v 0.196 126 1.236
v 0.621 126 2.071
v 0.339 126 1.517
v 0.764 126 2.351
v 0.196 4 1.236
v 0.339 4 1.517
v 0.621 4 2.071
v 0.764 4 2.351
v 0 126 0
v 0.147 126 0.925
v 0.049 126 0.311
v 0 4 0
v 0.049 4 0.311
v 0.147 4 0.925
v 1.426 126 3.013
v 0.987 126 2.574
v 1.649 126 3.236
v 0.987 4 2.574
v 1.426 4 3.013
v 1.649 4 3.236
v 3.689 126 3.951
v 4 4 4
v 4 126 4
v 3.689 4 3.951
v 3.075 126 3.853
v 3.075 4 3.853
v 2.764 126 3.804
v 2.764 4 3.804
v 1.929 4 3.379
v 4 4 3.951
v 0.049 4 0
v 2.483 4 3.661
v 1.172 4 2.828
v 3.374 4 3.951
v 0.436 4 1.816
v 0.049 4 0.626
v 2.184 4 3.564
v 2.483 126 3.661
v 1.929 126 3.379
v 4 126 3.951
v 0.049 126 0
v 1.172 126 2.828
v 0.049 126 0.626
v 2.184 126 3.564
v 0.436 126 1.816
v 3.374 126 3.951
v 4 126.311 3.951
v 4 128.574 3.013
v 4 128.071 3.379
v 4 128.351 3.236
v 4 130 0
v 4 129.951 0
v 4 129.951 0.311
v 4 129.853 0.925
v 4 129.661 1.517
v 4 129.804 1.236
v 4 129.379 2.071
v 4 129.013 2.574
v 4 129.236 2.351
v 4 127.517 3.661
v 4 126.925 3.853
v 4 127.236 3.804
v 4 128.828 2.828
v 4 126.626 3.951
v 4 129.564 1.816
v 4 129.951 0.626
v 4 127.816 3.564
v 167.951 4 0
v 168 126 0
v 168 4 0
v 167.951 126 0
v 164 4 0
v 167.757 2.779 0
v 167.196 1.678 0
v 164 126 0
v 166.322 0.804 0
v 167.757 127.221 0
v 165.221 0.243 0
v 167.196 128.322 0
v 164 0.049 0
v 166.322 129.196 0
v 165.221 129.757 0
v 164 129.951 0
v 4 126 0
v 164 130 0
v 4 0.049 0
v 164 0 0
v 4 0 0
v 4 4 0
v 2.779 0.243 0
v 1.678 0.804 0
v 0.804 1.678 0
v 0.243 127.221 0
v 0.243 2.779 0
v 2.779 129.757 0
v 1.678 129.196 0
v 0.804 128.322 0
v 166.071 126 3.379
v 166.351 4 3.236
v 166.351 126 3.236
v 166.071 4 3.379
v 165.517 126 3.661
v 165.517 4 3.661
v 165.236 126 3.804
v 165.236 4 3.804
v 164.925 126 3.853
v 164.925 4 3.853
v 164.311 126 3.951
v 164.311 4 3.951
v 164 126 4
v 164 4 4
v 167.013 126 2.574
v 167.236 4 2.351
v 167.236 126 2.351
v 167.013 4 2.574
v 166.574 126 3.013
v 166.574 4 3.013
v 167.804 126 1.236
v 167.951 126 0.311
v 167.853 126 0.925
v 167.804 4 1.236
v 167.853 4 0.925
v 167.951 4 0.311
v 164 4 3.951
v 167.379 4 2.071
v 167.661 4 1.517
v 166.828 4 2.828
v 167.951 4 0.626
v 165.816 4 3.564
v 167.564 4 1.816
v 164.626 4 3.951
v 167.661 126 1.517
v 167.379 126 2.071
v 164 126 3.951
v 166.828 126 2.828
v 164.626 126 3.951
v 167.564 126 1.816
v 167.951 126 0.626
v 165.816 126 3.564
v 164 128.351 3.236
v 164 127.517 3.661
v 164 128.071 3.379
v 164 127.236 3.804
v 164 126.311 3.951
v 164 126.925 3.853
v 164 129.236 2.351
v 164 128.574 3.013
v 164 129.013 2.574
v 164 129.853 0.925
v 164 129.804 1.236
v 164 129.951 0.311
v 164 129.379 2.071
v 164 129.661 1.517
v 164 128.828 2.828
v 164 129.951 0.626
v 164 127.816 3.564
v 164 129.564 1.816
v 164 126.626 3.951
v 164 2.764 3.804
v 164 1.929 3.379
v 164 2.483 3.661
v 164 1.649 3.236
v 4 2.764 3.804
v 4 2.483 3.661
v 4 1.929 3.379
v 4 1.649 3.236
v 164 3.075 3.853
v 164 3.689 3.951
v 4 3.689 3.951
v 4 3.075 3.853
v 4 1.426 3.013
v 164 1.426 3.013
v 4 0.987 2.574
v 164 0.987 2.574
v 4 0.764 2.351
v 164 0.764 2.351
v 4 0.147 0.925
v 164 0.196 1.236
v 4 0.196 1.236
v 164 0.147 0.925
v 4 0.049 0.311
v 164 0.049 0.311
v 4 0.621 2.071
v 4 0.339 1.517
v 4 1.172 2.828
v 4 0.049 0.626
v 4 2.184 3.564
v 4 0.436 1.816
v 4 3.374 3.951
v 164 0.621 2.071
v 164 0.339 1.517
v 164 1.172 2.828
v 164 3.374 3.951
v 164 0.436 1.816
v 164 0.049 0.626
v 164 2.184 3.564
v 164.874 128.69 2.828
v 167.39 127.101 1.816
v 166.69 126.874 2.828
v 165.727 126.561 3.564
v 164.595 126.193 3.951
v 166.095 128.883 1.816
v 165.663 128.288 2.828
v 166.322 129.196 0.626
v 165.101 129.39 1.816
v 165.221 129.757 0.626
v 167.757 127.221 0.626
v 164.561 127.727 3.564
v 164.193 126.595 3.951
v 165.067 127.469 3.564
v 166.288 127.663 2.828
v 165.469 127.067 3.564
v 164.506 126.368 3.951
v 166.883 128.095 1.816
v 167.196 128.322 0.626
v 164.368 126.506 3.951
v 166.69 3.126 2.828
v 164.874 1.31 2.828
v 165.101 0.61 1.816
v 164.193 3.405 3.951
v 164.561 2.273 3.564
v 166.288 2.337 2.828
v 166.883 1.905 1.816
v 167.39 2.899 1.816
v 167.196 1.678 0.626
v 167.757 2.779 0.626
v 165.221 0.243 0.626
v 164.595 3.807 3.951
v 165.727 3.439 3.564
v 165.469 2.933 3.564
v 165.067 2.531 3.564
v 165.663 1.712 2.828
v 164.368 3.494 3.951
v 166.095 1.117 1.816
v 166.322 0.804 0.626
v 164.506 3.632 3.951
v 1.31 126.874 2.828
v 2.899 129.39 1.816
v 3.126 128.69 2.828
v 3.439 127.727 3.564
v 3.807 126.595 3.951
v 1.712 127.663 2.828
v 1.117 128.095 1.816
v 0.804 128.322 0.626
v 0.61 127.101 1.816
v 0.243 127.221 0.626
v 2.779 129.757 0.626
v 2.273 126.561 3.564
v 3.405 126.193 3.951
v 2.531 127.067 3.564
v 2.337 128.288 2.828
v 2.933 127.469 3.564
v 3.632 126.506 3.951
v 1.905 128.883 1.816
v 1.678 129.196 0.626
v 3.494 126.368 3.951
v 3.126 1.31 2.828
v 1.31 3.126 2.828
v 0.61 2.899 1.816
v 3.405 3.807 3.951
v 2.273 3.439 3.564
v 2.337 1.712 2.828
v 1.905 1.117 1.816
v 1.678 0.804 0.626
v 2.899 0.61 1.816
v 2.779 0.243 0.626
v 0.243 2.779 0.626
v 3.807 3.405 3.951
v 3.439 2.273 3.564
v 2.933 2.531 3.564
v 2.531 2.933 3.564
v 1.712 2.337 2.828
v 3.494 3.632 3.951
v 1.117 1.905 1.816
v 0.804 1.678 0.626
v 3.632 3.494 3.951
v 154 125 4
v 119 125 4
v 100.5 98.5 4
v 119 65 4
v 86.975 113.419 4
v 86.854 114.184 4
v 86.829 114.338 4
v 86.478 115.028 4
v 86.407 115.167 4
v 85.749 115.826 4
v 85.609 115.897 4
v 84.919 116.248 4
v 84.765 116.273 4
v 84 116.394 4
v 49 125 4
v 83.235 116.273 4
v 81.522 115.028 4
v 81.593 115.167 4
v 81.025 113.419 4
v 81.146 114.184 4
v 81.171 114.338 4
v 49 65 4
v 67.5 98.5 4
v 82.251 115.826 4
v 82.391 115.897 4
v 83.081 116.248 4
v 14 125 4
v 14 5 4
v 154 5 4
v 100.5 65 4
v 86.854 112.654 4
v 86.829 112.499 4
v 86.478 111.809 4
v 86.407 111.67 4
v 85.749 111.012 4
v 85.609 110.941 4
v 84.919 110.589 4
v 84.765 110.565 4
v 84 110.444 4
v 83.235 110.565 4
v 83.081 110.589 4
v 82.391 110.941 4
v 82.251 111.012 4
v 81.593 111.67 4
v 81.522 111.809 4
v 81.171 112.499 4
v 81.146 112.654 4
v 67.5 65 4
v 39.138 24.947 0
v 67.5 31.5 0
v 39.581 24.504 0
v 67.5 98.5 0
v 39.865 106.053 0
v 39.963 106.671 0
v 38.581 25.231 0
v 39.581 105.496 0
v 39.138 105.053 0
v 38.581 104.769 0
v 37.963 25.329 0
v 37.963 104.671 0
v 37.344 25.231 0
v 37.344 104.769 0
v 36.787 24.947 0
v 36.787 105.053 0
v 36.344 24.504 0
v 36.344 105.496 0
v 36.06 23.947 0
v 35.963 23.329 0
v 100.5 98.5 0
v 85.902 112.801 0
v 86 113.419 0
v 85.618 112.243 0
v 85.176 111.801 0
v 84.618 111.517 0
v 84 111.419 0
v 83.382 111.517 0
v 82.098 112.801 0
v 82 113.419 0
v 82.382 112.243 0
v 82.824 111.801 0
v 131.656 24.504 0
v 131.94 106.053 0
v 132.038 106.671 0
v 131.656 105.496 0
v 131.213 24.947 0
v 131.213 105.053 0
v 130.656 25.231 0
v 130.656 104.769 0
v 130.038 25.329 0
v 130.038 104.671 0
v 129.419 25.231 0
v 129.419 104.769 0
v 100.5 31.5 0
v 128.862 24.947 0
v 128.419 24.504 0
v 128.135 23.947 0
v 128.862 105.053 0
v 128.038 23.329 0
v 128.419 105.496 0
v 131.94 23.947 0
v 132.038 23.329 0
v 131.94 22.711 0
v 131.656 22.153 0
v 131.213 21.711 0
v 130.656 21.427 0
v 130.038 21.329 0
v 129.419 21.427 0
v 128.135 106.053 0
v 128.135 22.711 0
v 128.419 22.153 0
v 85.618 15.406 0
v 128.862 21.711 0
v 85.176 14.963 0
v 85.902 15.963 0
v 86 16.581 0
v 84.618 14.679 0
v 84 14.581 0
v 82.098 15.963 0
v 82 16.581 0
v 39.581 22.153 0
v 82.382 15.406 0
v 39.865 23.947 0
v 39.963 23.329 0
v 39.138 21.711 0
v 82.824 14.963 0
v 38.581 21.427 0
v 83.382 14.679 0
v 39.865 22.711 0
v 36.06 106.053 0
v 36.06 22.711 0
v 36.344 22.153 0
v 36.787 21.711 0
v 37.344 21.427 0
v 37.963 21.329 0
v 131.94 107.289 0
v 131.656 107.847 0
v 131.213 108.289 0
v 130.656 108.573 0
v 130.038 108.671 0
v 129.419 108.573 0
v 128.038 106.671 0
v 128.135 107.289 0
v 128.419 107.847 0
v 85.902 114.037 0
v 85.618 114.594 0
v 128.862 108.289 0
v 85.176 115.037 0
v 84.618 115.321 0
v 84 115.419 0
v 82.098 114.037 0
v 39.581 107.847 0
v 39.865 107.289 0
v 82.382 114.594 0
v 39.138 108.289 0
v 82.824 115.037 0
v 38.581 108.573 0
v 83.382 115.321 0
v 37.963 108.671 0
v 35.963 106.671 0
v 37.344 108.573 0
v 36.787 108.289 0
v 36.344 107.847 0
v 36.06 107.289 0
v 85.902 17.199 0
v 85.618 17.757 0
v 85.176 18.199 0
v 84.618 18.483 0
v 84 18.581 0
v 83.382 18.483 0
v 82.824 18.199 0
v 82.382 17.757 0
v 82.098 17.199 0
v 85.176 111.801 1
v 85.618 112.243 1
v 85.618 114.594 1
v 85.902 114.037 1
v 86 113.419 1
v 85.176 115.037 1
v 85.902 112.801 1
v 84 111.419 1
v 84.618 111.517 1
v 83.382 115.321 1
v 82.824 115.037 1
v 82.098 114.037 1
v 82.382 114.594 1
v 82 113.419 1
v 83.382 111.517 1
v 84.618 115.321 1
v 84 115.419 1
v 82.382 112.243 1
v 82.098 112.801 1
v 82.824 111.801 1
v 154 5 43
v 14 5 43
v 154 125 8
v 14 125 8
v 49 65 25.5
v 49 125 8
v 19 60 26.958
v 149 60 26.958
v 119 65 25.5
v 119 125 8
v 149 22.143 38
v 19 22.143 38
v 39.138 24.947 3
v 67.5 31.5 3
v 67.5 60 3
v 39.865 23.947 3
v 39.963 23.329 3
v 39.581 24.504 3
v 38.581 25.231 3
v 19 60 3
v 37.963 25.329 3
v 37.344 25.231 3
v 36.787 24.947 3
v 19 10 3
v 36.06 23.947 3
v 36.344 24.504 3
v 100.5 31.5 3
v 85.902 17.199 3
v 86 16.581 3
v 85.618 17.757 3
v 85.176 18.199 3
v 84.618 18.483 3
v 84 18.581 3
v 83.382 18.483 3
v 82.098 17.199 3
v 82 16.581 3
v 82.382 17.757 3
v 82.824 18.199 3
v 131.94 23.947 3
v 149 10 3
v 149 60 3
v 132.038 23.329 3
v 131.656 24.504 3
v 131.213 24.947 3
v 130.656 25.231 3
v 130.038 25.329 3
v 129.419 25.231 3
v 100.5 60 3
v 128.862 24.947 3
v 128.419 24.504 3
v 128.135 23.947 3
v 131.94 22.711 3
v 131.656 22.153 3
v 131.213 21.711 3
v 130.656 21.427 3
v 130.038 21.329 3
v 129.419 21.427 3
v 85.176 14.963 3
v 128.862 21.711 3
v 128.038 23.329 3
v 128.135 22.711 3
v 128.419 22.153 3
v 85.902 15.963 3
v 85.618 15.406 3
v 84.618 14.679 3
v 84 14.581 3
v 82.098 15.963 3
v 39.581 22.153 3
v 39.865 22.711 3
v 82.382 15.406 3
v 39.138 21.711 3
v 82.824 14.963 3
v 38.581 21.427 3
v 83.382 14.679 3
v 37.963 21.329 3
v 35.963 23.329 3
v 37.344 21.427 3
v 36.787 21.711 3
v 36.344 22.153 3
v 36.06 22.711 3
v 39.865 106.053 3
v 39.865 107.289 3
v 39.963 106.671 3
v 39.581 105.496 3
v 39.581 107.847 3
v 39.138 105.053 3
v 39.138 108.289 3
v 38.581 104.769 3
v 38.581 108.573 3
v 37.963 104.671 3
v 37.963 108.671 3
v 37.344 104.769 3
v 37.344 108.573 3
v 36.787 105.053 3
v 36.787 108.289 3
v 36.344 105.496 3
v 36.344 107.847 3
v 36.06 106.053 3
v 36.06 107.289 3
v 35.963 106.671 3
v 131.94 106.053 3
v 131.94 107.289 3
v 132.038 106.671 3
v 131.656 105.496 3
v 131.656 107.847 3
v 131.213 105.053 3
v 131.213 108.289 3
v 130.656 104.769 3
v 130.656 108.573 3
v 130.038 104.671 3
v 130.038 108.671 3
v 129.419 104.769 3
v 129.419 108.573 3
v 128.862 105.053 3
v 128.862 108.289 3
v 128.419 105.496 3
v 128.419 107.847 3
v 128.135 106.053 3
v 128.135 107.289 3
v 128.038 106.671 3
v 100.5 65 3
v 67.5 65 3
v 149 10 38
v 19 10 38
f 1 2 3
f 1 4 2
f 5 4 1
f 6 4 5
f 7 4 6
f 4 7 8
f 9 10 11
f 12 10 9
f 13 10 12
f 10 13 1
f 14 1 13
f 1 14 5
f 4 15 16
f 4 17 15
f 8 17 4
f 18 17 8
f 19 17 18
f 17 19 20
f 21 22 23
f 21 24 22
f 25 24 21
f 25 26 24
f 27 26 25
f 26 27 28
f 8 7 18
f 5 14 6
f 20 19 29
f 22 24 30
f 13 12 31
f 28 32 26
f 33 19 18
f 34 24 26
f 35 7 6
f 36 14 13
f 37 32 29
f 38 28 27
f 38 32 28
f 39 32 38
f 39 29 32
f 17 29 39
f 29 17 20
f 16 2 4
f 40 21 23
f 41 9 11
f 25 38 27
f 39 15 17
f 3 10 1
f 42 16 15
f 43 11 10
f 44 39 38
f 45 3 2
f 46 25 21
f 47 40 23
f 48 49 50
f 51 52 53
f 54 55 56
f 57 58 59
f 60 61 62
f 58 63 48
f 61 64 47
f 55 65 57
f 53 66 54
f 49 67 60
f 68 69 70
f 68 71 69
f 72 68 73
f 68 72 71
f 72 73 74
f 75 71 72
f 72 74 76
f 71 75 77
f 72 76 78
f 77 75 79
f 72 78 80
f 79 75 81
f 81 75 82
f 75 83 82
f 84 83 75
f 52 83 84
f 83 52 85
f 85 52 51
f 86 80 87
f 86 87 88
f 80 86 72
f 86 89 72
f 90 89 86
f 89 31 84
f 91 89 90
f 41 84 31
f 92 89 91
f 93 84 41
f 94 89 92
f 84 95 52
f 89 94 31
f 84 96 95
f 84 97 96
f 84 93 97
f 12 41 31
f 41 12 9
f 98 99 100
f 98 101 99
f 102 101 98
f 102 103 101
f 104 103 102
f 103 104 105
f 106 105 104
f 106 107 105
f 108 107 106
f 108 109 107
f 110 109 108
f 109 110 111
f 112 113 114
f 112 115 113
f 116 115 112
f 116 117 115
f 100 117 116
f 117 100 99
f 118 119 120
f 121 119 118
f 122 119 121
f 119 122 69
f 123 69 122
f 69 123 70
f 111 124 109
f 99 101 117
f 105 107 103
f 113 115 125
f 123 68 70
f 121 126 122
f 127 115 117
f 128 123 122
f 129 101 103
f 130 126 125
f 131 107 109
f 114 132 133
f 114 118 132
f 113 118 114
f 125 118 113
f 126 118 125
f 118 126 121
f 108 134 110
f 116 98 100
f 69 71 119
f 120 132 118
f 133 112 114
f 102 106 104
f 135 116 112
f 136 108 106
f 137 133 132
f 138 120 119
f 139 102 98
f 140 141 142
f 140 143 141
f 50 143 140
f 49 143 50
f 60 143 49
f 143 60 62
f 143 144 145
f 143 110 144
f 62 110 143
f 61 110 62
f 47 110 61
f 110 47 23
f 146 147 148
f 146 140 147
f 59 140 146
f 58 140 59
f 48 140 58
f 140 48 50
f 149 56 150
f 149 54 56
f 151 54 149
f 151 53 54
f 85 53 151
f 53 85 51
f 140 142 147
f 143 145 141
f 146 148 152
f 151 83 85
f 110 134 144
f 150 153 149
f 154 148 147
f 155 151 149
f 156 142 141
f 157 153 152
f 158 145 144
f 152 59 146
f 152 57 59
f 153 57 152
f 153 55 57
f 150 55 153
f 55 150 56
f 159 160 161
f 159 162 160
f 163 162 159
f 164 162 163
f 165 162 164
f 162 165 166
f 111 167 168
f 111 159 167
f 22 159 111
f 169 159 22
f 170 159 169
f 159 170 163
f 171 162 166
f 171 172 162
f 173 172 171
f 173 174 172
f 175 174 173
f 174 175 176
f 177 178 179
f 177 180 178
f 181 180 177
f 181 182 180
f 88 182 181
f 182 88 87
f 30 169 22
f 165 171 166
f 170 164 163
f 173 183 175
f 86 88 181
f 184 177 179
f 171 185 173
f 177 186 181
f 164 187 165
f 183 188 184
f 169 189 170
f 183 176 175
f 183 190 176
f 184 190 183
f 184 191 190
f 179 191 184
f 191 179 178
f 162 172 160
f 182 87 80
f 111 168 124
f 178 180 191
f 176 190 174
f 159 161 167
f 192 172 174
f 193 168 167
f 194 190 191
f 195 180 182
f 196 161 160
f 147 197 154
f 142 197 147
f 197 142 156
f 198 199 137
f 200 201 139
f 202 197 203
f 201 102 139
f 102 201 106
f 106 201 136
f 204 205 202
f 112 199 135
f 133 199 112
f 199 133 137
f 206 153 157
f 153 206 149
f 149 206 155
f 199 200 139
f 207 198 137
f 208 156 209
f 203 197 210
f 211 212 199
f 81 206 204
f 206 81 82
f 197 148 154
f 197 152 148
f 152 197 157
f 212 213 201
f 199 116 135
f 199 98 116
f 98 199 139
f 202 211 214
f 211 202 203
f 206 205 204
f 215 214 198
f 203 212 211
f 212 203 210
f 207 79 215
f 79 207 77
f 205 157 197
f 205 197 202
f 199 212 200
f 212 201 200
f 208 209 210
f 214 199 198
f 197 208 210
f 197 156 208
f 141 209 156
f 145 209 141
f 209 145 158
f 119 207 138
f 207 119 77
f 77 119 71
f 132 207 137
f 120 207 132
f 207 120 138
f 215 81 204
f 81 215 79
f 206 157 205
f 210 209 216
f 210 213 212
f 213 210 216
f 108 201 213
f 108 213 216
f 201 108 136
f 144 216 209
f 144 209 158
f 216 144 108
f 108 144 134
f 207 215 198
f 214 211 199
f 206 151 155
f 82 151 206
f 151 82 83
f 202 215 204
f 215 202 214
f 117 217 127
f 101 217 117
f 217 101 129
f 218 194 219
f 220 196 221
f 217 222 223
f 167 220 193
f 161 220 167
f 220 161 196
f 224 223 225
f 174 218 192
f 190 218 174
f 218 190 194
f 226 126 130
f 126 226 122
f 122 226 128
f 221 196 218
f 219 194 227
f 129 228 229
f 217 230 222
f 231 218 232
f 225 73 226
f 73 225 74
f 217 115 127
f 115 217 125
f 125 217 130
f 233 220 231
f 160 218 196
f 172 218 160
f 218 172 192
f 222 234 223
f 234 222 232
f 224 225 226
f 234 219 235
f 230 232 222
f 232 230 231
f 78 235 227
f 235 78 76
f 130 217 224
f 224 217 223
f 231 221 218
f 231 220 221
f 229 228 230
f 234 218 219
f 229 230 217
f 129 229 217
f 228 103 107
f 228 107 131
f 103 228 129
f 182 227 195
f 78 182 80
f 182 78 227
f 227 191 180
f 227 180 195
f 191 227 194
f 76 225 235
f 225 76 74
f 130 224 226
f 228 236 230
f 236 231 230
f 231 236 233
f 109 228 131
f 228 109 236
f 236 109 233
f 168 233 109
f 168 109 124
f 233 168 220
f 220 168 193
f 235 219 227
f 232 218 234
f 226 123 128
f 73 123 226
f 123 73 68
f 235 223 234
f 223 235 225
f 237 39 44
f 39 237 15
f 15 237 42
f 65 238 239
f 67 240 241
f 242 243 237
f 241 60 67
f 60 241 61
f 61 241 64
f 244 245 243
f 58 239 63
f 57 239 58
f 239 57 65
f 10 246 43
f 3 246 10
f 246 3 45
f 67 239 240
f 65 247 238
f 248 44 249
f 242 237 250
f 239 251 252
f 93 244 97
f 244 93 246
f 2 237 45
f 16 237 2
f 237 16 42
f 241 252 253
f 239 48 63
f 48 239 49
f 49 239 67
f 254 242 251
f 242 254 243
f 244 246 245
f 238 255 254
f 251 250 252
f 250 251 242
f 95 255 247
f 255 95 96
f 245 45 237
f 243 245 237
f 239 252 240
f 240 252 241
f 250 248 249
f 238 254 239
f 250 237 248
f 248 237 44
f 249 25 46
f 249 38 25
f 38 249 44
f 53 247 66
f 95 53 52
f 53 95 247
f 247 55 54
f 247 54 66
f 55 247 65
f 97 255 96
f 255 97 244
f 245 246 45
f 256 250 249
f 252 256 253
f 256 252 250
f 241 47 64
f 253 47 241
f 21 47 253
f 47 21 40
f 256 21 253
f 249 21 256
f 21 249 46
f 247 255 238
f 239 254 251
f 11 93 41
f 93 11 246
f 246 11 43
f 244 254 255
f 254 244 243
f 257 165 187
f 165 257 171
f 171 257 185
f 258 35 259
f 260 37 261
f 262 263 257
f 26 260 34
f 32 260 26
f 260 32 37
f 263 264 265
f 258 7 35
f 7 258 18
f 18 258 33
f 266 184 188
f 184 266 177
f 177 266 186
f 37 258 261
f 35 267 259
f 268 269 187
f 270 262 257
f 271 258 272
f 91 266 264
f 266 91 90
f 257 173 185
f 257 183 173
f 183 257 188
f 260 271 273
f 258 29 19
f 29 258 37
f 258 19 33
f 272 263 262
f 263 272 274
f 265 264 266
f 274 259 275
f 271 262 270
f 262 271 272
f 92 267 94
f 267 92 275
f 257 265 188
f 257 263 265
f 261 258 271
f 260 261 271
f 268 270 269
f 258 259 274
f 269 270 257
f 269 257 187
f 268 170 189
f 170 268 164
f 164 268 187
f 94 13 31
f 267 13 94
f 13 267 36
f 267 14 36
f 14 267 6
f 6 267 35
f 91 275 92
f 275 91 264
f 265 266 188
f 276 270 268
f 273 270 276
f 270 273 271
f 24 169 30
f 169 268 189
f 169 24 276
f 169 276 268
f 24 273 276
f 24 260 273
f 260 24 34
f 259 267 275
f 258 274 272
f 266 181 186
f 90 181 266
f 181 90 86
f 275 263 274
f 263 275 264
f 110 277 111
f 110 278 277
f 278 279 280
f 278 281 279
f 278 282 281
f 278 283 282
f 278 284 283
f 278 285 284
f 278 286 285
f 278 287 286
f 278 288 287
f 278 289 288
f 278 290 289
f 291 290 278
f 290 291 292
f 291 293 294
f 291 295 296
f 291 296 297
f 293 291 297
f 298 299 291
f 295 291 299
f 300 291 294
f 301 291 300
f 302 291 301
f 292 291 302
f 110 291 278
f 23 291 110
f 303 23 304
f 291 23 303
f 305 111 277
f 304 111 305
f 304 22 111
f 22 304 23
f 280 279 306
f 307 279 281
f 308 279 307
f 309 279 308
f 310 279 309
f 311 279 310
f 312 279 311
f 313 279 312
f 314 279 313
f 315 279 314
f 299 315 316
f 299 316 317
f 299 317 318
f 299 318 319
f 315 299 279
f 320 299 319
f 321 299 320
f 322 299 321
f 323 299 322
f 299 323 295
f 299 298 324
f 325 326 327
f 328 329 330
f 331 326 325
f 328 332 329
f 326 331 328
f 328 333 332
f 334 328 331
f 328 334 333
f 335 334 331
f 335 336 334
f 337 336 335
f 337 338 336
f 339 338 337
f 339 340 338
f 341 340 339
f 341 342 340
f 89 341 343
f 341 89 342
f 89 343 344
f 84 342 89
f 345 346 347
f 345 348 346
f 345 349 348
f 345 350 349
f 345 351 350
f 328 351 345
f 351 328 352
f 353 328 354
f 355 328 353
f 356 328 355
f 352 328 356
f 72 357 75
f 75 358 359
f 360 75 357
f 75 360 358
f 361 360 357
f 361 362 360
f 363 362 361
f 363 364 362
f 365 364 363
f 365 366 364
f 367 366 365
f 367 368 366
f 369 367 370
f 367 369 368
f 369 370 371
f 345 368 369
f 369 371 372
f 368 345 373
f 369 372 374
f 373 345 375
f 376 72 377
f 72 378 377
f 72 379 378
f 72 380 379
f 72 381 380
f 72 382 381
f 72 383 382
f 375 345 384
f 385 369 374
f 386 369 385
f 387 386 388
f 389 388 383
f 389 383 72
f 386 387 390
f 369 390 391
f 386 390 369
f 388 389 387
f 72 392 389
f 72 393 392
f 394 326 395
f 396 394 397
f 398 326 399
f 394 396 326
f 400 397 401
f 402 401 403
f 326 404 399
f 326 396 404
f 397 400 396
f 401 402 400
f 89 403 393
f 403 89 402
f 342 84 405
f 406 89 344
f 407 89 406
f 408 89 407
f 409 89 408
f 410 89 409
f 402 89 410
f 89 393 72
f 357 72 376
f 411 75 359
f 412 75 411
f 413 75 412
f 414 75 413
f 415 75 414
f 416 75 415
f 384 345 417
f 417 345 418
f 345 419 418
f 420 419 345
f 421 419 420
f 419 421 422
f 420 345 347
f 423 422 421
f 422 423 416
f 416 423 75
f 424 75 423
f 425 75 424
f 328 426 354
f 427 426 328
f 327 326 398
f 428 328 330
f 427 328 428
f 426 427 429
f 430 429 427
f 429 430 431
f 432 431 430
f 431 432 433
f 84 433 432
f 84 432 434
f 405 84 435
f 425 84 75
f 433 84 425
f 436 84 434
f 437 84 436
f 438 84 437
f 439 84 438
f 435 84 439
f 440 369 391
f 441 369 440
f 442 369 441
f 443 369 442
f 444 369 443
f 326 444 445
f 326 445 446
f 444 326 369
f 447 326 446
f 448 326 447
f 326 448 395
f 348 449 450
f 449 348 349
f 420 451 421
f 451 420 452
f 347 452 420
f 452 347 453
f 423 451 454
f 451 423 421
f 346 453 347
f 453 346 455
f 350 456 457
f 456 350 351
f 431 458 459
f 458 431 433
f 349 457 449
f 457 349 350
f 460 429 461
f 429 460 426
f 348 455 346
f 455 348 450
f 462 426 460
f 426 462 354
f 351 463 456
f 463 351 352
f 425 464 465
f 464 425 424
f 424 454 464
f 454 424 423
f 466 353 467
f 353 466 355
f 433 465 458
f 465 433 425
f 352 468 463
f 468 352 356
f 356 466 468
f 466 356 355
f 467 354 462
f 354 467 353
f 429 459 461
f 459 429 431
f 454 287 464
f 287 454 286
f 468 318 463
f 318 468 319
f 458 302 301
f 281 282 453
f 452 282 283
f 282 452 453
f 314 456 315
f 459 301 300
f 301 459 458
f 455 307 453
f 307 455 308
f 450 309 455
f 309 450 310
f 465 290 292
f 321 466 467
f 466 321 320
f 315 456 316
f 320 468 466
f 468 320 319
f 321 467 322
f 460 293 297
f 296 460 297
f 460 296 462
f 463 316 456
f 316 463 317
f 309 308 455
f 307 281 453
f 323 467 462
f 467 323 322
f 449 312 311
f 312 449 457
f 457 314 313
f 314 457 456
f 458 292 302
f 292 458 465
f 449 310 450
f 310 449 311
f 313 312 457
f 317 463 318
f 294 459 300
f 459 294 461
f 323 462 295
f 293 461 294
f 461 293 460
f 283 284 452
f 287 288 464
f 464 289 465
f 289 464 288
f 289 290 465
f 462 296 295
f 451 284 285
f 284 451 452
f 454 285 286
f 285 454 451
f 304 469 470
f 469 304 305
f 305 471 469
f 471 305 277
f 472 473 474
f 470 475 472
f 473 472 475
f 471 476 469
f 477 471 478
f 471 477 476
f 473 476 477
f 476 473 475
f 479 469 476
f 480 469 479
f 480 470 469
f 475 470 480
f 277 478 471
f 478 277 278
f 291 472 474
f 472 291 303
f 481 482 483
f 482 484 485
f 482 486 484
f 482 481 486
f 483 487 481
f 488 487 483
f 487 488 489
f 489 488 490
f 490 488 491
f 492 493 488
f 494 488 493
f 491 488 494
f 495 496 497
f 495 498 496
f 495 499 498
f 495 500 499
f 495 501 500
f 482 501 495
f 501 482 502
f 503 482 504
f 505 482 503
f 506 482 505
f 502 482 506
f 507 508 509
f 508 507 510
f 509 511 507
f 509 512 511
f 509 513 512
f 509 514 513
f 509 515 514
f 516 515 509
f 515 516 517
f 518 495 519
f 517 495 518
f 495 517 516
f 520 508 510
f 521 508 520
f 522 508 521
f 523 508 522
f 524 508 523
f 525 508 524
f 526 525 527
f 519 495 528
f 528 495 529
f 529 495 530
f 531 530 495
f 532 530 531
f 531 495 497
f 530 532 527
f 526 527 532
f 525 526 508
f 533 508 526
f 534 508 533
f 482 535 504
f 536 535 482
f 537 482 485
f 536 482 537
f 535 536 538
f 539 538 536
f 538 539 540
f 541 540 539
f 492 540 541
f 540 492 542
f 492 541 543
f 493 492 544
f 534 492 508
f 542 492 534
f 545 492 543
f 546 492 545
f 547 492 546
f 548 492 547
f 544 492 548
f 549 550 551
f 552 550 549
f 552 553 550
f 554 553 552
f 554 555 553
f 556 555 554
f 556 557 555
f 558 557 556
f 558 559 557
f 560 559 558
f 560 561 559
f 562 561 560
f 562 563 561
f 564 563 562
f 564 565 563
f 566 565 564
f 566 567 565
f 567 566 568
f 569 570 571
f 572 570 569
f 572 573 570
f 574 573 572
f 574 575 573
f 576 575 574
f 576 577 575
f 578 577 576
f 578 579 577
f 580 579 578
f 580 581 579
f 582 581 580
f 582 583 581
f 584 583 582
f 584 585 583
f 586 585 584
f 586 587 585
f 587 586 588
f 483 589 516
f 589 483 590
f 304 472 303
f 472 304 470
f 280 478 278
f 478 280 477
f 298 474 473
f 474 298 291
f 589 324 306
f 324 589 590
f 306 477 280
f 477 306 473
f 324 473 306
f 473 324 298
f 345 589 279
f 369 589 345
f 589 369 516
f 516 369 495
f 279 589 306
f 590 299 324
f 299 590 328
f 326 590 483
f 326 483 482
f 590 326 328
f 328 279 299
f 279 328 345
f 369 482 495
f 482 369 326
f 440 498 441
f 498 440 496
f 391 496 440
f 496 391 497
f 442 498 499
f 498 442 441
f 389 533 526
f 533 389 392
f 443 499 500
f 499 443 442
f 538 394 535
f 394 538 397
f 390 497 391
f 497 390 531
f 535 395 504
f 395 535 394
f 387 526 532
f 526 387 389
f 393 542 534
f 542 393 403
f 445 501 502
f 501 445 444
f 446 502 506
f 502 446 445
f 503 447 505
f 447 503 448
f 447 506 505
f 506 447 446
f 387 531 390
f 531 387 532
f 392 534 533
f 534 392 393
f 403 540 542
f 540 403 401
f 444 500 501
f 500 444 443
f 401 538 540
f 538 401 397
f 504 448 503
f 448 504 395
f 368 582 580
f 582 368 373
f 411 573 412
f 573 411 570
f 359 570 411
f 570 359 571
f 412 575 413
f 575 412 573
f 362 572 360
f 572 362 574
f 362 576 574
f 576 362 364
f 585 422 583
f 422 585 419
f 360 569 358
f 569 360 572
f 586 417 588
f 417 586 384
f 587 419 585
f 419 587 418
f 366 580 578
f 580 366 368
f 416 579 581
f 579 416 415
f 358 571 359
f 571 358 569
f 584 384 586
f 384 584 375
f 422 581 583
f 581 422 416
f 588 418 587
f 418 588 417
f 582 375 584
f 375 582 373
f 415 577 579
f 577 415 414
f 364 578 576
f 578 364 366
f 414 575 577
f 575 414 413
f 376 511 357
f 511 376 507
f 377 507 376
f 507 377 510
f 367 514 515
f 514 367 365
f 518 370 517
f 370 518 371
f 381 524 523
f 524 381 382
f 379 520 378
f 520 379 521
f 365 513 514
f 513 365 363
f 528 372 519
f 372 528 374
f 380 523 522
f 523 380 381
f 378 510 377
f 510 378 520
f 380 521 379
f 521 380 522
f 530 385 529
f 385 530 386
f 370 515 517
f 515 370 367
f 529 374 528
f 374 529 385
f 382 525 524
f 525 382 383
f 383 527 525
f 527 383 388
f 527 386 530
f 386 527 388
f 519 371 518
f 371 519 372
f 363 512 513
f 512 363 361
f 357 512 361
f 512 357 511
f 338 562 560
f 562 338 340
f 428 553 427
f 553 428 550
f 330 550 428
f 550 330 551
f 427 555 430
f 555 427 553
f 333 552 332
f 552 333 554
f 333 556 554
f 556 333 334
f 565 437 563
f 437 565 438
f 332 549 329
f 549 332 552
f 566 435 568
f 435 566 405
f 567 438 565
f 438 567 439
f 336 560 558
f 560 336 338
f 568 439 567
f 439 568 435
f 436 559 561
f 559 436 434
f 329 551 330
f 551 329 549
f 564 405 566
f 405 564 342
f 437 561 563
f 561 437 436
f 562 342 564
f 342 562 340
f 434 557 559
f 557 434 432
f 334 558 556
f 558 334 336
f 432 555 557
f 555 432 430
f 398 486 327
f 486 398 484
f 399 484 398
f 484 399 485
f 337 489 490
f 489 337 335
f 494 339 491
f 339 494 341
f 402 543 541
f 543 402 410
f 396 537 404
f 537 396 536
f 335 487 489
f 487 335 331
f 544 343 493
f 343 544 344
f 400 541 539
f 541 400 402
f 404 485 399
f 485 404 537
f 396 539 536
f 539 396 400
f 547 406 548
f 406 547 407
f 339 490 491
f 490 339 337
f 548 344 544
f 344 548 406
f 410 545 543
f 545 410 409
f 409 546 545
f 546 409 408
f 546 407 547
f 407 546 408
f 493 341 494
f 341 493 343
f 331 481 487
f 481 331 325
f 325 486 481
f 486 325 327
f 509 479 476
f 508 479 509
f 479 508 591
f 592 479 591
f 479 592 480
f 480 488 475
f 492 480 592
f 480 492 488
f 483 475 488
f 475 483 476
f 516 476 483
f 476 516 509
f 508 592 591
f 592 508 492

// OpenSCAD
plate_x = 168;
plate_y = 130;
plate_z = 4;

decora_x = 33;
decora_y = 67;

decora_screws = 48.41875;
box_screws = 41.67125;
gang_offset = 46.0375;

dock_width = 140;
dock_height = 120;

$fn = 20;

union() {
	plate();
	dock();
}


module plate() {
	difference() {
		union() {
			translate([plate_z, plate_z, 0]) 
			cube(size = [plate_x - (2 * plate_z), plate_y - (2 * plate_z), plate_z]);
		
			// left side
			translate([plate_z, plate_z, 0])
			rotate([-90, 180, 0])
			quarter_cylinder(plate_y - (2 * plate_z), plate_z);

			// right side
			translate([plate_x - plate_z, plate_z, 0])
			rotate([-90, -90, 0])
			quarter_cylinder(plate_y - (2 * plate_z), plate_z);
	
			// top side
			translate([plate_x - plate_z, plate_y - plate_z, 0])
			rotate([0, -90, 0])
			quarter_cylinder(plate_x - (2 * plate_z), plate_z);

			// bottom side
			translate([plate_z, plate_z, 0])
			rotate([0, -90, 180])
			quarter_cylinder(plate_x - (2 * plate_z), plate_z);

			// top right
			translate([plate_x - plate_z, plate_y - plate_z, 0])
			semihemisphere(plate_z);

			// bottom right
			translate([plate_x - plate_z, plate_z, 0])
			rotate([0, 0, -90])
			semihemisphere(plate_z);

			// top left
			translate([plate_z, plate_y - plate_z, 0])
			rotate([0, 0, 90])
			semihemisphere(plate_z);

			// bottom left
			translate([plate_z, plate_z, 0])
			rotate([0, 0, 180])
			semihemisphere(plate_z);
		}

		translate([(plate_x - decora_x) / 2, (plate_y - decora_y) / 2, 0])
		cube(size = [decora_x, decora_y, plate_z]);

		// top decora screw
		translate([plate_x / 2, (plate_y / 2) + decora_screws, 0])
		inset_screw(plate_z);

		// bottom decora screw
		translate([plate_x / 2, (plate_y / 2) - decora_screws, 0])
		screw(plate_z);

		// top right screw
		translate([plate_x / 2 + gang_offset, (plate_y / 2) + box_screws, 0])
		screw(plate_z);

		// bottom right screw
		translate([plate_x / 2 + gang_offset, (plate_y / 2) - box_screws, 0])
		screw(plate_z);

		// top left screw
		translate([plate_x / 2 - gang_offset, (plate_y / 2) + box_screws, 0])
		screw(plate_z);

		// bottom left screw
		translate([plate_x / 2 - gang_offset, (plate_y / 2) - box_screws, 0])
		screw(plate_z);

		// remove a small part of the dock
		dock_solid();
	}
}

module dock() {
	difference() {
		dock_solid();
		
		translate([(plate_x - (dock_width - 10)) / 2, 10, plate_z - 1]) 
		cube([dock_width - 10, (dock_height / 2) - 10, 35]);
	}
}

module dock_solid() {
	translate([(plate_x - dock_width) / 2, (plate_y - dock_height) / 2, plate_z - 1])
	difference() {
		rotate([90, 0, 90])
		linear_extrude(height=dock_width)
		polygon(points=[[0,0], [0,40], [dock_height,5], [dock_height,0]]);	

		translate([dock_width / 4, dock_height / 2, 0])
		cube(dock_width / 2, dock_height / 2, 40);
	}
}

module inset_screw(h) {
	union() {
		cylinder(r=2, h=h-3);
	
		translate([0, 0, h-3])
		cylinder(r1=2, r2=3.3, h=h);
	}
}

module screw(h) {
	cylinder(r=2, h=h);
}

module quarter_cylinder(h, r) {
	difference() {
		cylinder(h=h, r=r);

		translate([-r, 0, 0])
		cube(size=[r, r, h]);

		translate([-r, -r, 0])
		cube(size=[2 * r, r, h]);
	}
}

module semihemisphere(r) {
	difference() {
		sphere(r=r);

		translate([-r, 0, -r])
		cube(size=[r, r, 2 * r]);

		translate([-r, -r, -r])
		cube(size=[2 * r, r, 2 * r]);

		translate([0, 0, -r])
		cube(r, r, r);
	}
}
